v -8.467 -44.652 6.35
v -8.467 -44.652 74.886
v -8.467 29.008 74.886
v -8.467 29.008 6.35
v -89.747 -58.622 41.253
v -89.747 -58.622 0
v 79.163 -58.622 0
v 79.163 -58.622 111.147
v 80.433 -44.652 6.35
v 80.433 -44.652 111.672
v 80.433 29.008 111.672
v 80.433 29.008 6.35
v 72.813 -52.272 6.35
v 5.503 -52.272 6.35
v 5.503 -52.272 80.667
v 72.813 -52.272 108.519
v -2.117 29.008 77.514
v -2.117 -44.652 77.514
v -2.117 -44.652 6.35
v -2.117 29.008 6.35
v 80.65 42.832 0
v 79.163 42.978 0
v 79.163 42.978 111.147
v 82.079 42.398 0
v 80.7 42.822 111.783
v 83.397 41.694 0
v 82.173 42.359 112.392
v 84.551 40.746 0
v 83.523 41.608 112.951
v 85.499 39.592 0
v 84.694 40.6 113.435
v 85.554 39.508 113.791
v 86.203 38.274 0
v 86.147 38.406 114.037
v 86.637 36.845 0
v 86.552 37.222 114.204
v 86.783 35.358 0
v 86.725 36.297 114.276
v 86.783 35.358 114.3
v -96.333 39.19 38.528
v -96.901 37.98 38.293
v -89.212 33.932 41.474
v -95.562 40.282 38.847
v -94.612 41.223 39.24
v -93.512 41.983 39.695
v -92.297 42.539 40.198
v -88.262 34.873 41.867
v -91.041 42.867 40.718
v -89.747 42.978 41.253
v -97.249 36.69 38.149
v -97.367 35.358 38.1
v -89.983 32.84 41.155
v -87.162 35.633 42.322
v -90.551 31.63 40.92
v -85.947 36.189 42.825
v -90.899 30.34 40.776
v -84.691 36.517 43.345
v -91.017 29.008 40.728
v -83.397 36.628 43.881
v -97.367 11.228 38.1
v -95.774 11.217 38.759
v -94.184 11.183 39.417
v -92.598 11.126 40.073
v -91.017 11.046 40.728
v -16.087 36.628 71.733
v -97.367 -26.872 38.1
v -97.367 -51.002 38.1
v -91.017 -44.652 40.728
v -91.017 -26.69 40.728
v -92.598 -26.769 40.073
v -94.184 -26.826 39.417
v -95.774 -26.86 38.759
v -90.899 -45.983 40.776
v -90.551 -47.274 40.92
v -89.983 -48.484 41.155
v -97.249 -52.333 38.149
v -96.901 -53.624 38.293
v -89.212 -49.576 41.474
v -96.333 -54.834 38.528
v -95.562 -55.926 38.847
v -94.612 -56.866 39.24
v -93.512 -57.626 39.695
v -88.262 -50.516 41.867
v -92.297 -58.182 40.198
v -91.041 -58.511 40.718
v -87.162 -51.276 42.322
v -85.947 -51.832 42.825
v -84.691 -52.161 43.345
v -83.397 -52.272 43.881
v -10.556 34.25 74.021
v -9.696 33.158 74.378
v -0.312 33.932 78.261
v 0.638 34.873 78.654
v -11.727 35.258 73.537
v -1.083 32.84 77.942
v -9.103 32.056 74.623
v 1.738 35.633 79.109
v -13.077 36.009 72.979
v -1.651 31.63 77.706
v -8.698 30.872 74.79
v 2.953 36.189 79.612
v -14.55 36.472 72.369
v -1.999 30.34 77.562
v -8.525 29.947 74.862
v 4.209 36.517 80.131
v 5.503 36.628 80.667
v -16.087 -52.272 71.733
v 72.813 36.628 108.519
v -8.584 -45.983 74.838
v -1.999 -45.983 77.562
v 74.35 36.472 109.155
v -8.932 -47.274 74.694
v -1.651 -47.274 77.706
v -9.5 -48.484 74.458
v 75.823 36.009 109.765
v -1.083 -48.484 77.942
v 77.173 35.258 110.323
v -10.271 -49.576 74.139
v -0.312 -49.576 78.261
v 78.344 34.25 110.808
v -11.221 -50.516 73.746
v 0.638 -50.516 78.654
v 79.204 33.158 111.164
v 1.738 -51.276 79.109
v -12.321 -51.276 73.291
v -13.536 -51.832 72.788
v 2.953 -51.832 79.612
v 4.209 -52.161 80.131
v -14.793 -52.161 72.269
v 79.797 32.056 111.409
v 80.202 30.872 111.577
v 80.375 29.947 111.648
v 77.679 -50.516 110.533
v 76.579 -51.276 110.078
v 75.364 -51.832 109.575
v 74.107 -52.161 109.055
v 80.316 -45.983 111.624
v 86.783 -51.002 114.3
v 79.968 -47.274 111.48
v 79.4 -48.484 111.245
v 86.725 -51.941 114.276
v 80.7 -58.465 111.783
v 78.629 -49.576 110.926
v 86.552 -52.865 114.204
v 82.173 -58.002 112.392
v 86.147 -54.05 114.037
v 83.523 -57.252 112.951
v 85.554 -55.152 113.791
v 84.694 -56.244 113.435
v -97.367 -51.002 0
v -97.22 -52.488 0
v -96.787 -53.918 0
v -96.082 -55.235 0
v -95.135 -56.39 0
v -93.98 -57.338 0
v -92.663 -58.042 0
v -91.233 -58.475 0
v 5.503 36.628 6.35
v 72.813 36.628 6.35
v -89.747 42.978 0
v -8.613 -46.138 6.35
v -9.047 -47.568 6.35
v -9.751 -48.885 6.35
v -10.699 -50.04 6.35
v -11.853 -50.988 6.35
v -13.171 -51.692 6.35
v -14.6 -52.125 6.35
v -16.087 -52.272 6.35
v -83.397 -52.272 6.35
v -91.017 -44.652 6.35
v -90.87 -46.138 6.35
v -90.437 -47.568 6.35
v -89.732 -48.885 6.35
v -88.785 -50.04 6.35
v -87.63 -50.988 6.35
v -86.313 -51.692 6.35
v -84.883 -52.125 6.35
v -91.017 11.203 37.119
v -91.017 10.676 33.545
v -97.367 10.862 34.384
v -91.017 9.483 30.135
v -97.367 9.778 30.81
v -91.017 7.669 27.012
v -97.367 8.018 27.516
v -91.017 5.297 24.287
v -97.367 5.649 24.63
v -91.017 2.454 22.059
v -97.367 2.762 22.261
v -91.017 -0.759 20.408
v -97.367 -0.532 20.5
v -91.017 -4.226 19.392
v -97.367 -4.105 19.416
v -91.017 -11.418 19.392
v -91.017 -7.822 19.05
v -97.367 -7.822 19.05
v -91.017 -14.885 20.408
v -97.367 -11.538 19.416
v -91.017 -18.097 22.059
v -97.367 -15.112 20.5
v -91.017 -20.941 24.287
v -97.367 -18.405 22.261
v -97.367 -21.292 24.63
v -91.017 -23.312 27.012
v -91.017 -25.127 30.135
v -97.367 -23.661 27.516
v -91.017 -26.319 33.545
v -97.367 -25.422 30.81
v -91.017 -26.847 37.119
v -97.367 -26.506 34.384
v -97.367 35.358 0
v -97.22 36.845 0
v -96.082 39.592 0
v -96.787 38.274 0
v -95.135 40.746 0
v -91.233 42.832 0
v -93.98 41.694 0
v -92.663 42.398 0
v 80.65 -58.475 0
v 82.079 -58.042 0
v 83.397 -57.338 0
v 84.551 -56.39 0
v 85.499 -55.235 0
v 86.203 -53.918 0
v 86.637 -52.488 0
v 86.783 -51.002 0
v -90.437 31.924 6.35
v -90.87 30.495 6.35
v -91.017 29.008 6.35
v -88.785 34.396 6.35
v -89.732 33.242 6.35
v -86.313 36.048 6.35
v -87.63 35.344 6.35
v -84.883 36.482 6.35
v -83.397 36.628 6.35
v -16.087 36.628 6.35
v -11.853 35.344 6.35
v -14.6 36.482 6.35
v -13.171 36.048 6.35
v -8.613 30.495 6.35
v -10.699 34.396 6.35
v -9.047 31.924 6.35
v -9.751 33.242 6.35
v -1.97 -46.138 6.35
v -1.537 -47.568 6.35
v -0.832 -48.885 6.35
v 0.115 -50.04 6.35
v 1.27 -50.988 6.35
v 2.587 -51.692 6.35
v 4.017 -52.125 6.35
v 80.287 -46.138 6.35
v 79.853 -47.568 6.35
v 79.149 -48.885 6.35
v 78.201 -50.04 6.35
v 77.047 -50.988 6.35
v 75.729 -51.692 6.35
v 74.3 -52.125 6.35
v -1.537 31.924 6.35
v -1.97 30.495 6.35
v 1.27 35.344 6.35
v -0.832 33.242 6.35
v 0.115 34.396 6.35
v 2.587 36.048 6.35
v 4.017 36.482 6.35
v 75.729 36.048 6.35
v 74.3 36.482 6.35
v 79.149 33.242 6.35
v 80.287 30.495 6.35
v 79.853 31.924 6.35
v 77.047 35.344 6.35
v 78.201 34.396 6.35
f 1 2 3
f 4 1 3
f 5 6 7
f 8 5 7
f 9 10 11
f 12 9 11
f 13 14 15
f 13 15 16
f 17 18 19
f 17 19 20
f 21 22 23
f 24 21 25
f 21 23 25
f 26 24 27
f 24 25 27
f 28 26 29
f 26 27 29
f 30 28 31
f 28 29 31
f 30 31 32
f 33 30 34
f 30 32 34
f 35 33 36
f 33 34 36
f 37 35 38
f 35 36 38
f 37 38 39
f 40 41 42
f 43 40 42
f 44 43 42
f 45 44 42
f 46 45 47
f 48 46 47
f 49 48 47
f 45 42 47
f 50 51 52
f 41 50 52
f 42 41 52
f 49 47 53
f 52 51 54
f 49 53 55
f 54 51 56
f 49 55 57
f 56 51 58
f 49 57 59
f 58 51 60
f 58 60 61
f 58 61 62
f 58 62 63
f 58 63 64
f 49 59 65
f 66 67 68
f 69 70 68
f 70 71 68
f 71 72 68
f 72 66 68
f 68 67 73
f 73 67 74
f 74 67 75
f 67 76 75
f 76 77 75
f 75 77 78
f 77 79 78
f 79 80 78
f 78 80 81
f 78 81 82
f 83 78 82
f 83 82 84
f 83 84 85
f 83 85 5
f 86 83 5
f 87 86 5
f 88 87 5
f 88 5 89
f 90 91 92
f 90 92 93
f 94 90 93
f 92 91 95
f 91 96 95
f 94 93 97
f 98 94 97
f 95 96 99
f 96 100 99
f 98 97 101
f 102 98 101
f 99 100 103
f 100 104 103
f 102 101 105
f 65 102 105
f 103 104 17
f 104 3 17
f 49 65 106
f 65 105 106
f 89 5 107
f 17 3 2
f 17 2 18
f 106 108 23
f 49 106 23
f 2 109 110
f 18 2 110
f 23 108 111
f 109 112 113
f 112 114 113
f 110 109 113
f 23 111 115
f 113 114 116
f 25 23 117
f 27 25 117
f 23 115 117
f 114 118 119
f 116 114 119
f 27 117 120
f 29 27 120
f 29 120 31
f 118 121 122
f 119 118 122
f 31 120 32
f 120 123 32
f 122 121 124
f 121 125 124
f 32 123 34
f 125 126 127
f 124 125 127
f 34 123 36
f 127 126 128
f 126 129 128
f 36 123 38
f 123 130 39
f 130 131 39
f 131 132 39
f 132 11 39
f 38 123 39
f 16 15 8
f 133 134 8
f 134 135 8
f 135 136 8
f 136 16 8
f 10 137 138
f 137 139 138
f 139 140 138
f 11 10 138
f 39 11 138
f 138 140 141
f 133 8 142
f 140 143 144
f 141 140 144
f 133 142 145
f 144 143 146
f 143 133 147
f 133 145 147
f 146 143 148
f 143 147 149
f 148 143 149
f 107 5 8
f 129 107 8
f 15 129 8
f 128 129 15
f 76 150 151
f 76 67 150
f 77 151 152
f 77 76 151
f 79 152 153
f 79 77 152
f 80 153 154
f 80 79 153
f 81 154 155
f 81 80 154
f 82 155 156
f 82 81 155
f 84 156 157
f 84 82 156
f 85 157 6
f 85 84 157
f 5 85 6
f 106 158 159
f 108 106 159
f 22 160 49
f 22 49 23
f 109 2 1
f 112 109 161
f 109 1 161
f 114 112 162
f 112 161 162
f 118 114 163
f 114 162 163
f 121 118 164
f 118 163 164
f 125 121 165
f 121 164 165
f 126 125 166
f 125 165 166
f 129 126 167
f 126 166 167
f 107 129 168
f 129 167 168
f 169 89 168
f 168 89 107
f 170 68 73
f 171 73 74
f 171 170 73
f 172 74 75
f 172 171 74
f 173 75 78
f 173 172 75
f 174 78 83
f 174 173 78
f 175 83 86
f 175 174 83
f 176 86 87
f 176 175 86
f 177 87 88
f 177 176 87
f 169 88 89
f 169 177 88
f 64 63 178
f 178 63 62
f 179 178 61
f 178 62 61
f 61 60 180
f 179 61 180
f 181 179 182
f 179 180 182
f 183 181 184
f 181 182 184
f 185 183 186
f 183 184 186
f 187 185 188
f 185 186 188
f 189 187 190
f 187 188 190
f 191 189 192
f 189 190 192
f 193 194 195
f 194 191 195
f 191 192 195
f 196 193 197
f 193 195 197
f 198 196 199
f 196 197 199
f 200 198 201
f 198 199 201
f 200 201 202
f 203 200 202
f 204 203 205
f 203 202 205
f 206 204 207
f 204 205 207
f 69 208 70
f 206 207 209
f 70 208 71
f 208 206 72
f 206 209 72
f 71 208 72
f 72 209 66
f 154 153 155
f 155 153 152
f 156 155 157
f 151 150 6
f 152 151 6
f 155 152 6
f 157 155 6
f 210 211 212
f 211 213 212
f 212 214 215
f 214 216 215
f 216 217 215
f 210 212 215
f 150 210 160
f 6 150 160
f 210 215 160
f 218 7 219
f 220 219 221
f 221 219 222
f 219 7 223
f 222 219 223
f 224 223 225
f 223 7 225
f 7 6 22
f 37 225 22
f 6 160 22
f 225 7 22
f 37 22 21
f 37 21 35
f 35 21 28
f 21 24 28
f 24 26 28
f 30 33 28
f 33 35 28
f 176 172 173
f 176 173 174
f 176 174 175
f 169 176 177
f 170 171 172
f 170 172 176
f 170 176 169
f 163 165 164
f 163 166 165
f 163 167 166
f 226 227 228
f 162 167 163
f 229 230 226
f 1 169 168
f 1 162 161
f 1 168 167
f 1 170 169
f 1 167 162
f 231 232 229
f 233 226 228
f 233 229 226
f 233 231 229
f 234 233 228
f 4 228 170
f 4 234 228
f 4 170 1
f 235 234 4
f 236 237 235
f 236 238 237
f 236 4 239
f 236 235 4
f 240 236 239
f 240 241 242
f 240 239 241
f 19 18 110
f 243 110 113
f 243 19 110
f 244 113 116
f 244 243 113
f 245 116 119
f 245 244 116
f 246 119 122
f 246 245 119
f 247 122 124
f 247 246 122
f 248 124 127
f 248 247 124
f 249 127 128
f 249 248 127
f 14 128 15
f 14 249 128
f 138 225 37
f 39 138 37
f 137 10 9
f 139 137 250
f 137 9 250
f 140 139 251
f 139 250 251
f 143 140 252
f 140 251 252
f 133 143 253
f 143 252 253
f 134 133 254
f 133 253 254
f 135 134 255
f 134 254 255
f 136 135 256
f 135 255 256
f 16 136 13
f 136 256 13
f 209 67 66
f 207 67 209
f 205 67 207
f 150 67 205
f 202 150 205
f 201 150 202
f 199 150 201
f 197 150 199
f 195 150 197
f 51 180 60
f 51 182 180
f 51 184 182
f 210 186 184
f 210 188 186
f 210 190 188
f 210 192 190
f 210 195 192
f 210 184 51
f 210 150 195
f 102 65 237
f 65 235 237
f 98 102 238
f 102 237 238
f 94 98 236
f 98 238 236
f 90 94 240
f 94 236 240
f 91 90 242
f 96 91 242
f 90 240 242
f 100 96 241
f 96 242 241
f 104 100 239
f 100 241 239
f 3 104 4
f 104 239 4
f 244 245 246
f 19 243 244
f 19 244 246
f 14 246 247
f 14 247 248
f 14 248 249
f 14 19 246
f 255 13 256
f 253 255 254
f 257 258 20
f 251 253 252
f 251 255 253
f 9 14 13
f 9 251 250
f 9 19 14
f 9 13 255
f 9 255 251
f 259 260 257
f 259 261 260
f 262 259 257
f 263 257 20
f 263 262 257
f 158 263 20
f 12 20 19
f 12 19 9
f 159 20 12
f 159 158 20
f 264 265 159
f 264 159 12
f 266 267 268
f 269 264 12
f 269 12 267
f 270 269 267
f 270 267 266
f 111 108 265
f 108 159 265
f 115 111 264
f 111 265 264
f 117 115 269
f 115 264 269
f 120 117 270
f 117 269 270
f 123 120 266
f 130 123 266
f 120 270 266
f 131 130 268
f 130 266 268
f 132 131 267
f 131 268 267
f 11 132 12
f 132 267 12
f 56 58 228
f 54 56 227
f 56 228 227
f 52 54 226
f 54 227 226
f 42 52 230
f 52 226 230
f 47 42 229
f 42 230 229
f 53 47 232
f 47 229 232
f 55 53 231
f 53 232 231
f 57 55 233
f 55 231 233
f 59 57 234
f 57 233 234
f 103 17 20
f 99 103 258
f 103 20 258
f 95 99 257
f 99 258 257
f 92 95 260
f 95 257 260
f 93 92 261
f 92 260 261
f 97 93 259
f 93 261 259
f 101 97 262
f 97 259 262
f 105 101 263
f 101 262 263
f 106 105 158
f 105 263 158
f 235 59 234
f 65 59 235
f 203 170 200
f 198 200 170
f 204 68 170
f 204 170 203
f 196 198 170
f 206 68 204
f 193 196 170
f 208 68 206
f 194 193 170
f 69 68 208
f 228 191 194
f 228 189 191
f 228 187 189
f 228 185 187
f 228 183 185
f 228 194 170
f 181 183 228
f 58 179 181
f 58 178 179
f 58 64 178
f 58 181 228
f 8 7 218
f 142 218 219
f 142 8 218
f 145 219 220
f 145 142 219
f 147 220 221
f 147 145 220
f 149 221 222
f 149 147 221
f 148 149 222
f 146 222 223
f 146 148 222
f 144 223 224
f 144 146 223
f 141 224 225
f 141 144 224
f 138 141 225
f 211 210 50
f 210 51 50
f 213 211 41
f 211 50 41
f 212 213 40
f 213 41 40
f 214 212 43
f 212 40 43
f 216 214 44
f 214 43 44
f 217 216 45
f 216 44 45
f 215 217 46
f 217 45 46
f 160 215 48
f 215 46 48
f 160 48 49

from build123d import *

# Parameters (mm, degrees)
F0_W     = 184.15
F0_H     = 101.6
F1_DEPTH = 114.3
F2_W     = 82.55
F2_H     = 88.9
F3_DEPTH = 107.95
F5_DEPTH = 101.601
F6_R     = 7.62
F7_R     = 19.05
F8_DEPTH = 25.4


with BuildPart() as f1:
    # F0 (on Top) → F1 (new body)
    with BuildSketch(Plane.XY):
        with Locations((-5.291667, -7.821875)):
            Rectangle(F0_W, F0_H)
    extrude(amount=F1_DEPTH)

    # F2 (on face) → F3 (cut)
    with BuildSketch(Plane.XY.offset(114.3)):
        with Locations((-49.741667, -7.821875)):
            Rectangle(F2_W, F2_H)
        with Locations((39.158333, -7.821875)):
            Rectangle(F2_W, F2_H)
    extrude(amount=-F3_DEPTH, mode=Mode.SUBTRACT)

    # F4 (on face) → F5 (cut, through all)
    with BuildSketch(Plane.XZ.offset(58.621875)):
        Polygon((-97.366667, 114.3), (-97.366667, 38.1), (86.783333, 114.3), align=None)
    extrude(amount=-F5_DEPTH, mode=Mode.SUBTRACT)

    # F6
    f6_edges = [f1.edges().sort_by_distance(p)[0] for p in [
        (80.433333, 36.628125, 59.011207),
        (-8.466667, 36.628125, 40.618103),
        (-97.366667, 42.978125, 19.05),
        (-97.366667, -58.621875, 19.05),
        (86.783333, -58.621875, 57.15),
        (80.433333, -52.271875, 59.011207),
        (-8.466667, -52.271875, 40.618103),
        (86.783333, 42.978125, 57.15),
        (-2.116667, -52.271875, 41.931897),
        (-91.016667, -52.271875, 23.538793),
        (-2.116667, 36.628125, 41.931897),
        (-91.016667, 36.628125, 23.538793),
    ]]
    fillet(f6_edges, radius=F6_R)

    # F7 (on face) → F8 (cut)
    with BuildSketch(Plane(origin=(-97.366667, 0, 0), x_dir=(0, -1, 0), z_dir=(-1, 0, 0))):
        with Locations((7.821875, 38.1)):
            Circle(F7_R)
    extrude(amount=-F8_DEPTH, mode=Mode.SUBTRACT)


solid = f1.part
